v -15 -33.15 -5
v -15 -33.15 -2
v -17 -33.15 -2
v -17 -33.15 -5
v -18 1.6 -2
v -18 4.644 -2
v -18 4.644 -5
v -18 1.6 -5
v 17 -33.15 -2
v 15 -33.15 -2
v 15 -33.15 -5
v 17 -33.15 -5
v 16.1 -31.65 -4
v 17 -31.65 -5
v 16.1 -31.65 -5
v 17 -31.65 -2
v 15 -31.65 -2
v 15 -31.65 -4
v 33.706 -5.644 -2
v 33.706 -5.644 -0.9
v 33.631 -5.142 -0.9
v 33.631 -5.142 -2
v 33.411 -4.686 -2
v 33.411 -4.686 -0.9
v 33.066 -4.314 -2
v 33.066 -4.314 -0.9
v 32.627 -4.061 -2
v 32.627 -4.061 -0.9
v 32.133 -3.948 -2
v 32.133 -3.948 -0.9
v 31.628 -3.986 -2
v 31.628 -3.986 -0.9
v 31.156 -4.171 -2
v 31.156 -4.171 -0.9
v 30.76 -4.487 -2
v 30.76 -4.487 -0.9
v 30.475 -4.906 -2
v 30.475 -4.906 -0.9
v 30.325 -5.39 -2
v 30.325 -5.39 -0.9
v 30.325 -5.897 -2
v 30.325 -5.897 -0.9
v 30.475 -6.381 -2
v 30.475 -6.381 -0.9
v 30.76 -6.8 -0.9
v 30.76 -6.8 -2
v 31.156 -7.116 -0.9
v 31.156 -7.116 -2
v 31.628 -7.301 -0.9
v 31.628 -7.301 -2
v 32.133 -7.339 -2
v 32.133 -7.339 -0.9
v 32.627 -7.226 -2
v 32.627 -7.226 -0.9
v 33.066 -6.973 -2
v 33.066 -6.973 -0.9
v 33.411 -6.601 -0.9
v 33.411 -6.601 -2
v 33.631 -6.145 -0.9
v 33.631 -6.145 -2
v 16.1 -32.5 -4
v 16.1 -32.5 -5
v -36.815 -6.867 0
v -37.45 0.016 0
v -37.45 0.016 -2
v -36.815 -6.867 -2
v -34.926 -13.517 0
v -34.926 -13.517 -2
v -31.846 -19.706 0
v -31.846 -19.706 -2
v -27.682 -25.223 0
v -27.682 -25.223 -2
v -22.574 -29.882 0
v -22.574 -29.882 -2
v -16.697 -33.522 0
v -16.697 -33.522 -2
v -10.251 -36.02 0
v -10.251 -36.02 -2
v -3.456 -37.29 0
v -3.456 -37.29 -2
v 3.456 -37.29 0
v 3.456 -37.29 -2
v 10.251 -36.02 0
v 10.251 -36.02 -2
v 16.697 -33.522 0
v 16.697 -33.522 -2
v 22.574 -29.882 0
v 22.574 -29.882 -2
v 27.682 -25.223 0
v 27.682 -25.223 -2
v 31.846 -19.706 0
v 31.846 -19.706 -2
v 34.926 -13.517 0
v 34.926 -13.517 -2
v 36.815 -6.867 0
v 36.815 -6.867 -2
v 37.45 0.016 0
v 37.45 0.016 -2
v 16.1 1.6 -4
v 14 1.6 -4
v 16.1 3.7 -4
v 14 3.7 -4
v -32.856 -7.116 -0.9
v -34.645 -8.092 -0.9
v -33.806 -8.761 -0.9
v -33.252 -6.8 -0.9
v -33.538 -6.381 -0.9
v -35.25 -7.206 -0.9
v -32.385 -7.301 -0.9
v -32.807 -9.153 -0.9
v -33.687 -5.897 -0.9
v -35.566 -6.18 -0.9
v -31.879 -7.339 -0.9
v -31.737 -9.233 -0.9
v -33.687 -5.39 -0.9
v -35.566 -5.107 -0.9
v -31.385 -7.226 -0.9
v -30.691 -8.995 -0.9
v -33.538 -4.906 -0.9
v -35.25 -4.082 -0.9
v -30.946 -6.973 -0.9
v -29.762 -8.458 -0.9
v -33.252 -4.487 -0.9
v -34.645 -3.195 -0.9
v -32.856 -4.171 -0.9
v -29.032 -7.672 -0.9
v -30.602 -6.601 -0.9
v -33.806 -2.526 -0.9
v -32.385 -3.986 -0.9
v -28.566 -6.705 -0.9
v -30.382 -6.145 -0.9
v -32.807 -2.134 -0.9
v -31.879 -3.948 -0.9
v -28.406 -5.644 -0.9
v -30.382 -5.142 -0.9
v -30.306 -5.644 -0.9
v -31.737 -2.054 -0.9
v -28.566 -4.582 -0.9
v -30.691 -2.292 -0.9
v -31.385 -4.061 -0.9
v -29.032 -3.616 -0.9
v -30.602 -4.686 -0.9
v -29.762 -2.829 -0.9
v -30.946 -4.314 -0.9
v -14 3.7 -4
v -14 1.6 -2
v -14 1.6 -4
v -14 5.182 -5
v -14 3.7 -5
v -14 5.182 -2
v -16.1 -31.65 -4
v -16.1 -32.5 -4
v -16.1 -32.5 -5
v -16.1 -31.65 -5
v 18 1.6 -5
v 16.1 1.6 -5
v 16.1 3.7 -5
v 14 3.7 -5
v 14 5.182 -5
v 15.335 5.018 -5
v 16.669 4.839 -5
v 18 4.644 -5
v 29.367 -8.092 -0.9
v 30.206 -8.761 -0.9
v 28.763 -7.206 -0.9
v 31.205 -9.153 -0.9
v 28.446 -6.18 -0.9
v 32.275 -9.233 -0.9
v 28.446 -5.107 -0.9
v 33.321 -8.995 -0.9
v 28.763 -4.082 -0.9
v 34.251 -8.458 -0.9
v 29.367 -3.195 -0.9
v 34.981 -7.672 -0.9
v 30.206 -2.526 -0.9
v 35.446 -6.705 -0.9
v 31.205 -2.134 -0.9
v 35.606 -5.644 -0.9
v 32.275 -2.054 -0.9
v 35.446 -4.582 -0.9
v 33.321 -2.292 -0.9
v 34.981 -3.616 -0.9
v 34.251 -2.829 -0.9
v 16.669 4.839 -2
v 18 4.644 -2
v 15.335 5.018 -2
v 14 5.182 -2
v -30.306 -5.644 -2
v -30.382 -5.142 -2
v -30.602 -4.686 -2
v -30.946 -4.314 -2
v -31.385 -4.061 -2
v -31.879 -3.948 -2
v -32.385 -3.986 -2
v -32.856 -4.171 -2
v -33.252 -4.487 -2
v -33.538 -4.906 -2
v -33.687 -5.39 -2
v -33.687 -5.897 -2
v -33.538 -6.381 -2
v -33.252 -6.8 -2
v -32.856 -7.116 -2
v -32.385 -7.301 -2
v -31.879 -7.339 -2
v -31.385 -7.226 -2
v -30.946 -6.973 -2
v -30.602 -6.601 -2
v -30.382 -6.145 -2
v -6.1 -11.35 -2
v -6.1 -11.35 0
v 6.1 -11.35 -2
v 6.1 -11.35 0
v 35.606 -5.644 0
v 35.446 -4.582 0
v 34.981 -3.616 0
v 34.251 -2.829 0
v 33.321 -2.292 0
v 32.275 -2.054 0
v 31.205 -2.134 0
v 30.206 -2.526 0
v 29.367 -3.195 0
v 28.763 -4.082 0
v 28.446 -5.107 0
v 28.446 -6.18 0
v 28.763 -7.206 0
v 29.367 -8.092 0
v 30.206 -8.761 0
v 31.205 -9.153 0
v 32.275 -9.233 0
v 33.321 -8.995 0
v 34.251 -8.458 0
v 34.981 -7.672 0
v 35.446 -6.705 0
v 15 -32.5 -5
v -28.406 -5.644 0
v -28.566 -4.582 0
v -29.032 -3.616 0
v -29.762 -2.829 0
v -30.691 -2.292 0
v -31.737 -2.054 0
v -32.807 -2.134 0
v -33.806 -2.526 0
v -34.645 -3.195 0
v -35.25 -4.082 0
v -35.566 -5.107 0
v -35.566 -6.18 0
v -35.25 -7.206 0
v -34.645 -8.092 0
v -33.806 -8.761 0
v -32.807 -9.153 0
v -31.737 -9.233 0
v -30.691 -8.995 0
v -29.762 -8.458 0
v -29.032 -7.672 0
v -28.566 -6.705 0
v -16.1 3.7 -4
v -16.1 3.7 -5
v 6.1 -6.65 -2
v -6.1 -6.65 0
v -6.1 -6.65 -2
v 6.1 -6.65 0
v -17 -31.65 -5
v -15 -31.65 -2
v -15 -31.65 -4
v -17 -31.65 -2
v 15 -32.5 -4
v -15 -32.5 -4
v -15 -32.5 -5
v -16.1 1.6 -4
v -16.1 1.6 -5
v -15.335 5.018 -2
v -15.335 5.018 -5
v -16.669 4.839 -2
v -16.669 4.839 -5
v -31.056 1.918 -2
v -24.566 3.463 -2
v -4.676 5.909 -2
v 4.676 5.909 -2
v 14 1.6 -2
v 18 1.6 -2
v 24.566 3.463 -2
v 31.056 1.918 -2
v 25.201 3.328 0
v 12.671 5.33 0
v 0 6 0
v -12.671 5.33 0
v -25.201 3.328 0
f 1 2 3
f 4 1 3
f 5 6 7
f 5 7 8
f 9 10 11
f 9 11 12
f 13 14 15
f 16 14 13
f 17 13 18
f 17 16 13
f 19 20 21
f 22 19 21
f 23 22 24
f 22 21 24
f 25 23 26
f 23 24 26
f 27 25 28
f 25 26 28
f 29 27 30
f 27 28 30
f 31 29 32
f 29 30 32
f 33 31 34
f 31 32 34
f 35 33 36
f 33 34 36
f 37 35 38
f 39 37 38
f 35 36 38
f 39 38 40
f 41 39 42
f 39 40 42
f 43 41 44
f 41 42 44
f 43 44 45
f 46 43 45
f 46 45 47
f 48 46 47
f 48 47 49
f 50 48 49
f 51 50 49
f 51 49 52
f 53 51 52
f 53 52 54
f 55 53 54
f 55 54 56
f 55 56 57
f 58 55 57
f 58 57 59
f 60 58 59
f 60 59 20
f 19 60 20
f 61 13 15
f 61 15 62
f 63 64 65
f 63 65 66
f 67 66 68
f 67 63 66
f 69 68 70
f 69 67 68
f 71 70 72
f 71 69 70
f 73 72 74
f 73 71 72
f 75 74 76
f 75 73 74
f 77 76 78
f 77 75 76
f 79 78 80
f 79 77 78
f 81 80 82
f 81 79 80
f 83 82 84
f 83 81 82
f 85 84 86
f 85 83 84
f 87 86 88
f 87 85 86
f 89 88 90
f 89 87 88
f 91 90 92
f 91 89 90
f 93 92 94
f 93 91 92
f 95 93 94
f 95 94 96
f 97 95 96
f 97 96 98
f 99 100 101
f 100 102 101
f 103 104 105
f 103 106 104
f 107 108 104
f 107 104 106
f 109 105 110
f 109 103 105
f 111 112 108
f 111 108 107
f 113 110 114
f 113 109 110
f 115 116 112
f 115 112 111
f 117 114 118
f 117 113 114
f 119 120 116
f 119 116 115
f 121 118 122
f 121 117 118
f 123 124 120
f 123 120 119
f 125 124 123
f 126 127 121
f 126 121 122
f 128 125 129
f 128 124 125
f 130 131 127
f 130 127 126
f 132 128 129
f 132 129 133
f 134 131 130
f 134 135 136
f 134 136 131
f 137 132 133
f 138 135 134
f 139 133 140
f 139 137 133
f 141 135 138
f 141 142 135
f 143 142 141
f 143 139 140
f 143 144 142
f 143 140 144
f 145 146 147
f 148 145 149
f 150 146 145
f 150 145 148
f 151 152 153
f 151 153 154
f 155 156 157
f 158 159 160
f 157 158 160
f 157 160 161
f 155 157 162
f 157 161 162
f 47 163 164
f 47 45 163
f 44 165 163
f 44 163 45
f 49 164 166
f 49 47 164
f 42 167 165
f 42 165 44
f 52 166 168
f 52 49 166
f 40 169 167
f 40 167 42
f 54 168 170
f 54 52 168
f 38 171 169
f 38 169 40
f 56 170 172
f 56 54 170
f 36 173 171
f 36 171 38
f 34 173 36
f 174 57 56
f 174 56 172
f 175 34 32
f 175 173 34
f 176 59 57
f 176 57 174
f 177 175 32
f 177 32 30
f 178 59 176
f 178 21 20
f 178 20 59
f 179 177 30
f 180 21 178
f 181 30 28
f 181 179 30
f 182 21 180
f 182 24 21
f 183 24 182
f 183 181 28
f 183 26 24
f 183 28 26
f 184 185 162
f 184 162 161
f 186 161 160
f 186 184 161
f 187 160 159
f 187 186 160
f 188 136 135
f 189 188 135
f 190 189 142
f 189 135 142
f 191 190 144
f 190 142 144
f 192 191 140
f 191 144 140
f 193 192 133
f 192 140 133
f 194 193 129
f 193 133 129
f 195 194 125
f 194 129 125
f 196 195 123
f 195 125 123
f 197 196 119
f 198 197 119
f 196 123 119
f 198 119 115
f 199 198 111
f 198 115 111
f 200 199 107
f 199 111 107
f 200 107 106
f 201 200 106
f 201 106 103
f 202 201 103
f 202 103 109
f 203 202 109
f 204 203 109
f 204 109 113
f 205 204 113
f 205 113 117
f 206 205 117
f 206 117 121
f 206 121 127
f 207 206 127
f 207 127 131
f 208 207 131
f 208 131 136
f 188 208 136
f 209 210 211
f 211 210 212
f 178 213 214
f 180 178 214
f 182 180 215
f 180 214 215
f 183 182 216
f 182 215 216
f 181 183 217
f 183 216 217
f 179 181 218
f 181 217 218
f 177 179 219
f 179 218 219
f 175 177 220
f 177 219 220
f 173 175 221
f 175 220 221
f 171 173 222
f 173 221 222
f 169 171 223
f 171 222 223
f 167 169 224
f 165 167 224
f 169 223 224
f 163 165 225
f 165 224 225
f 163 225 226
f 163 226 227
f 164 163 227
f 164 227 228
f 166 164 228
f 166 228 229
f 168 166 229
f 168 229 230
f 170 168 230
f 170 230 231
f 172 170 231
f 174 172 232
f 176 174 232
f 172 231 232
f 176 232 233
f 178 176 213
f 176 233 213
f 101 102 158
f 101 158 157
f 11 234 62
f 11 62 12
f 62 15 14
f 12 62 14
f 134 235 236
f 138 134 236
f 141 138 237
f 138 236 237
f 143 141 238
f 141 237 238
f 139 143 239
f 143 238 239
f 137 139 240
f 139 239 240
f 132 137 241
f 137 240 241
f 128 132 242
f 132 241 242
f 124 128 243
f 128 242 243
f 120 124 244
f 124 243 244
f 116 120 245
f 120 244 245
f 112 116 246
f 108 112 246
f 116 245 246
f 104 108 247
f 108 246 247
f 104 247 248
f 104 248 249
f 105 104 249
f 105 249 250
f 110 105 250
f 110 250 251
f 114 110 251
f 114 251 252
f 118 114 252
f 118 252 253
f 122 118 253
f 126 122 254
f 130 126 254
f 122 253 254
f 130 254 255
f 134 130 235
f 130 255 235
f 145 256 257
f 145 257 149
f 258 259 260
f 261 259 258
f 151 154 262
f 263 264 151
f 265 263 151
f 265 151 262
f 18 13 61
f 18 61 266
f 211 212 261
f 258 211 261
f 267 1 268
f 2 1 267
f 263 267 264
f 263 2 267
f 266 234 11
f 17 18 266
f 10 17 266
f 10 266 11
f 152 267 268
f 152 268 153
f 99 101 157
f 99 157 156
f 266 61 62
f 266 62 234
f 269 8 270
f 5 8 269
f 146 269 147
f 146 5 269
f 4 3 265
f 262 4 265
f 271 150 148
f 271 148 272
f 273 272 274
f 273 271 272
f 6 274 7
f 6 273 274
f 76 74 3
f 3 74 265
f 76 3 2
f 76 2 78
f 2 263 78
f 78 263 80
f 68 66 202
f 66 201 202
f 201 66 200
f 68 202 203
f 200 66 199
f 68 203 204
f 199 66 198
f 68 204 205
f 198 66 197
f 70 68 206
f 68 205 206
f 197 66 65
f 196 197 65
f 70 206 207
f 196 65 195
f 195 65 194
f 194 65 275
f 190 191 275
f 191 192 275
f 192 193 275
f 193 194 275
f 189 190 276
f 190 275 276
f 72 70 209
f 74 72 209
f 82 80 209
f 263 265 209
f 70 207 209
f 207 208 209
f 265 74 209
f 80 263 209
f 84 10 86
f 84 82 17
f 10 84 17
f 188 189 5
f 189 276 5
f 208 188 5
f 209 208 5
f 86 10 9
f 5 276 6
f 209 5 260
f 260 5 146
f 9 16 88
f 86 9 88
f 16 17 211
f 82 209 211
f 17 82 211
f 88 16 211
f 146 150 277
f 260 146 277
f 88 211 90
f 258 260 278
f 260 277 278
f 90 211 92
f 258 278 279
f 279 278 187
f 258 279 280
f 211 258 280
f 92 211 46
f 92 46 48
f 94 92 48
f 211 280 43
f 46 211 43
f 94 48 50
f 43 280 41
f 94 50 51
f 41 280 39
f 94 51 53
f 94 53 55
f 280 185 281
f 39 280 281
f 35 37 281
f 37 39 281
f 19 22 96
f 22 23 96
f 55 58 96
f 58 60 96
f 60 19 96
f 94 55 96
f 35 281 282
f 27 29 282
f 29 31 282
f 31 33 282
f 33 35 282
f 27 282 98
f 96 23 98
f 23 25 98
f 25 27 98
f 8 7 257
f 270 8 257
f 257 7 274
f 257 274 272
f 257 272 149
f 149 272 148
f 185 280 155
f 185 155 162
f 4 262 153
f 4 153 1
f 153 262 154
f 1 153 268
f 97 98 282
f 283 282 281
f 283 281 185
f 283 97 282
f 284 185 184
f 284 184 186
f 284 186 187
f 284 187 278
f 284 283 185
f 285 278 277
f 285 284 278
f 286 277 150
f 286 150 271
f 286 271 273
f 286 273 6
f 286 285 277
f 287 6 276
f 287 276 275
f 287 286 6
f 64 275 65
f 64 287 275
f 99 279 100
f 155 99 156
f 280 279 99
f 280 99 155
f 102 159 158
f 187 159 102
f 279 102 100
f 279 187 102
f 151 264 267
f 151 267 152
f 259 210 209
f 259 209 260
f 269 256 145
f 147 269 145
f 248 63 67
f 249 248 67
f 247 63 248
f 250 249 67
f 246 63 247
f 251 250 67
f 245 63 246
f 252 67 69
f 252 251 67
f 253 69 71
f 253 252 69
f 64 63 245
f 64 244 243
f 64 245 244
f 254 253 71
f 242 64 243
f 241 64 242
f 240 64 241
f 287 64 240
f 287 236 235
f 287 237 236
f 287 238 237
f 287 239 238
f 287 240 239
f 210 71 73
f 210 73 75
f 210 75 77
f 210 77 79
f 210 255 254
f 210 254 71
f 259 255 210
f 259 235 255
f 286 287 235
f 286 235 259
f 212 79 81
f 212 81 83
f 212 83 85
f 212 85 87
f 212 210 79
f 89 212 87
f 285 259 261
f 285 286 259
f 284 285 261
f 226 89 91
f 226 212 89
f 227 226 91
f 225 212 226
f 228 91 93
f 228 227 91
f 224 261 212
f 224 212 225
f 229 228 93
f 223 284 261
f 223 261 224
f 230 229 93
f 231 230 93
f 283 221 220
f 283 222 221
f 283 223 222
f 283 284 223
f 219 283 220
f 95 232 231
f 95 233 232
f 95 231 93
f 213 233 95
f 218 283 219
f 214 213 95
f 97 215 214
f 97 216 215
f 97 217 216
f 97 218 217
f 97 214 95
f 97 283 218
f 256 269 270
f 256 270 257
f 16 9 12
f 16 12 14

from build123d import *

# Parameters (mm, degrees)
SKETCH_2_R          = 1.7
SKETCH_2_W          = 12.2
SKETCH_2_H          = 4.7
EXTRUDE_1_DEPTH     = 2
SKETCH_3_R          = 3.6
CUT_EXTRUDE_1_DEPTH = 0.9
SKETCH_4_W          = 2
SKETCH_4_H          = 1.5
EXTRUDE_2_DEPTH     = 2
EXTRUDE_3_DEPTH     = 1


with BuildPart() as part:
    # 草图2 → 凸台-拉伸1 (new body)
    with BuildSketch(Plane.XY):
        with BuildLine():
            ThreePointArc((-37.449996405, 0.016409414), (0, -37.45), (37.449996405, 0.016409414))
            ThreePointArc((37.449996405, 0.016409414), (0, 6), (-37.449996405, 0.016409414))
        make_face()
        with Locations((-32.006251973, -5.643565774)):
            Circle(SKETCH_2_R, mode=Mode.SUBTRACT)
        with Locations((32.006251973, -5.643565774)):
            Circle(SKETCH_2_R, mode=Mode.SUBTRACT)
        with Locations((0, -9)):
            Rectangle(SKETCH_2_W, SKETCH_2_H, mode=Mode.SUBTRACT)
    extrude(amount=-EXTRUDE_1_DEPTH)

    # 草图3 → 切除-拉伸1 (cut)
    with BuildSketch(Plane.XY):
        with Locations((-32.006251973, -5.643565774)):
            Circle(SKETCH_3_R)
        with Locations((32.006251973, -5.643565774)):
            Circle(SKETCH_3_R)
    extrude(amount=-CUT_EXTRUDE_1_DEPTH, mode=Mode.SUBTRACT)

    # 草图4 → 凸台-拉伸2 (add)
    with BuildSketch(Plane(origin=(0, 0, -2), x_dir=(-1, 0, 0), z_dir=(0, 0, -1))):
        with Locations((-16, -32.4)):
            Rectangle(SKETCH_4_W, SKETCH_4_H)
        with Locations((16, -32.4)):
            Rectangle(SKETCH_4_W, SKETCH_4_H)
        with BuildLine():
            Line((-18, 1.6), (-18, 4.644461846))
            ThreePointArc((-18, 4.644461846), (-16.002255751, 4.929933515), (-14, 5.181822509))
            Line((-14, 5.181822509), (-14, 1.6))
            Line((-14, 1.6), (-18, 1.6))
        make_face()
        with BuildLine():
            Line((18, 4.644461846), (18, 1.6))
            Line((18, 1.6), (14, 1.6))
            Line((14, 1.6), (14, 5.181822509))
            ThreePointArc((14, 5.181822509), (16.002255751, 4.929933515), (18, 4.644461846))
        make_face()
    extrude(amount=EXTRUDE_2_DEPTH)

    # 草图5 → 凸台-拉伸3 (add)
    with BuildSketch(Plane(origin=(0, 0, -4), x_dir=(-1, 0, 0), z_dir=(0, 0, -1))):
        Polygon((-16.1, -32.5), (-15, -32.5), (-15, -33.15), (-17, -33.15), (-17, -31.65), (-16.1, -31.65), align=None)
        Polygon((16.1, -32.5), (16.1, -31.65), (17, -31.65), (17, -33.15), (15, -33.15), (15, -32.5), align=None)
        with BuildLine():
            Line((-18, 1.6), (-18, 4.644461846))
            ThreePointArc((-18, 4.644461846), (-16.002255751, 4.929933515), (-14, 5.181822509))
            Line((-14, 5.181822509), (-14, 3.7))
            Line((-14, 3.7), (-16.1, 3.7))
            Line((-16.1, 3.7), (-16.1, 1.6))
            Line((-16.1, 1.6), (-18, 1.6))
        make_face()
        with BuildLine():
            Line((14, 3.7), (14, 5.181822509))
            ThreePointArc((14, 5.181822509), (16.002255751, 4.929933515), (18, 4.644461846))
            Line((18, 4.644461846), (18, 1.6))
            Line((18, 1.6), (16.1, 1.6))
            Line((16.1, 1.6), (16.1, 3.7))
            Line((16.1, 3.7), (14, 3.7))
        make_face()
    extrude(amount=EXTRUDE_3_DEPTH)


solid = part.part
